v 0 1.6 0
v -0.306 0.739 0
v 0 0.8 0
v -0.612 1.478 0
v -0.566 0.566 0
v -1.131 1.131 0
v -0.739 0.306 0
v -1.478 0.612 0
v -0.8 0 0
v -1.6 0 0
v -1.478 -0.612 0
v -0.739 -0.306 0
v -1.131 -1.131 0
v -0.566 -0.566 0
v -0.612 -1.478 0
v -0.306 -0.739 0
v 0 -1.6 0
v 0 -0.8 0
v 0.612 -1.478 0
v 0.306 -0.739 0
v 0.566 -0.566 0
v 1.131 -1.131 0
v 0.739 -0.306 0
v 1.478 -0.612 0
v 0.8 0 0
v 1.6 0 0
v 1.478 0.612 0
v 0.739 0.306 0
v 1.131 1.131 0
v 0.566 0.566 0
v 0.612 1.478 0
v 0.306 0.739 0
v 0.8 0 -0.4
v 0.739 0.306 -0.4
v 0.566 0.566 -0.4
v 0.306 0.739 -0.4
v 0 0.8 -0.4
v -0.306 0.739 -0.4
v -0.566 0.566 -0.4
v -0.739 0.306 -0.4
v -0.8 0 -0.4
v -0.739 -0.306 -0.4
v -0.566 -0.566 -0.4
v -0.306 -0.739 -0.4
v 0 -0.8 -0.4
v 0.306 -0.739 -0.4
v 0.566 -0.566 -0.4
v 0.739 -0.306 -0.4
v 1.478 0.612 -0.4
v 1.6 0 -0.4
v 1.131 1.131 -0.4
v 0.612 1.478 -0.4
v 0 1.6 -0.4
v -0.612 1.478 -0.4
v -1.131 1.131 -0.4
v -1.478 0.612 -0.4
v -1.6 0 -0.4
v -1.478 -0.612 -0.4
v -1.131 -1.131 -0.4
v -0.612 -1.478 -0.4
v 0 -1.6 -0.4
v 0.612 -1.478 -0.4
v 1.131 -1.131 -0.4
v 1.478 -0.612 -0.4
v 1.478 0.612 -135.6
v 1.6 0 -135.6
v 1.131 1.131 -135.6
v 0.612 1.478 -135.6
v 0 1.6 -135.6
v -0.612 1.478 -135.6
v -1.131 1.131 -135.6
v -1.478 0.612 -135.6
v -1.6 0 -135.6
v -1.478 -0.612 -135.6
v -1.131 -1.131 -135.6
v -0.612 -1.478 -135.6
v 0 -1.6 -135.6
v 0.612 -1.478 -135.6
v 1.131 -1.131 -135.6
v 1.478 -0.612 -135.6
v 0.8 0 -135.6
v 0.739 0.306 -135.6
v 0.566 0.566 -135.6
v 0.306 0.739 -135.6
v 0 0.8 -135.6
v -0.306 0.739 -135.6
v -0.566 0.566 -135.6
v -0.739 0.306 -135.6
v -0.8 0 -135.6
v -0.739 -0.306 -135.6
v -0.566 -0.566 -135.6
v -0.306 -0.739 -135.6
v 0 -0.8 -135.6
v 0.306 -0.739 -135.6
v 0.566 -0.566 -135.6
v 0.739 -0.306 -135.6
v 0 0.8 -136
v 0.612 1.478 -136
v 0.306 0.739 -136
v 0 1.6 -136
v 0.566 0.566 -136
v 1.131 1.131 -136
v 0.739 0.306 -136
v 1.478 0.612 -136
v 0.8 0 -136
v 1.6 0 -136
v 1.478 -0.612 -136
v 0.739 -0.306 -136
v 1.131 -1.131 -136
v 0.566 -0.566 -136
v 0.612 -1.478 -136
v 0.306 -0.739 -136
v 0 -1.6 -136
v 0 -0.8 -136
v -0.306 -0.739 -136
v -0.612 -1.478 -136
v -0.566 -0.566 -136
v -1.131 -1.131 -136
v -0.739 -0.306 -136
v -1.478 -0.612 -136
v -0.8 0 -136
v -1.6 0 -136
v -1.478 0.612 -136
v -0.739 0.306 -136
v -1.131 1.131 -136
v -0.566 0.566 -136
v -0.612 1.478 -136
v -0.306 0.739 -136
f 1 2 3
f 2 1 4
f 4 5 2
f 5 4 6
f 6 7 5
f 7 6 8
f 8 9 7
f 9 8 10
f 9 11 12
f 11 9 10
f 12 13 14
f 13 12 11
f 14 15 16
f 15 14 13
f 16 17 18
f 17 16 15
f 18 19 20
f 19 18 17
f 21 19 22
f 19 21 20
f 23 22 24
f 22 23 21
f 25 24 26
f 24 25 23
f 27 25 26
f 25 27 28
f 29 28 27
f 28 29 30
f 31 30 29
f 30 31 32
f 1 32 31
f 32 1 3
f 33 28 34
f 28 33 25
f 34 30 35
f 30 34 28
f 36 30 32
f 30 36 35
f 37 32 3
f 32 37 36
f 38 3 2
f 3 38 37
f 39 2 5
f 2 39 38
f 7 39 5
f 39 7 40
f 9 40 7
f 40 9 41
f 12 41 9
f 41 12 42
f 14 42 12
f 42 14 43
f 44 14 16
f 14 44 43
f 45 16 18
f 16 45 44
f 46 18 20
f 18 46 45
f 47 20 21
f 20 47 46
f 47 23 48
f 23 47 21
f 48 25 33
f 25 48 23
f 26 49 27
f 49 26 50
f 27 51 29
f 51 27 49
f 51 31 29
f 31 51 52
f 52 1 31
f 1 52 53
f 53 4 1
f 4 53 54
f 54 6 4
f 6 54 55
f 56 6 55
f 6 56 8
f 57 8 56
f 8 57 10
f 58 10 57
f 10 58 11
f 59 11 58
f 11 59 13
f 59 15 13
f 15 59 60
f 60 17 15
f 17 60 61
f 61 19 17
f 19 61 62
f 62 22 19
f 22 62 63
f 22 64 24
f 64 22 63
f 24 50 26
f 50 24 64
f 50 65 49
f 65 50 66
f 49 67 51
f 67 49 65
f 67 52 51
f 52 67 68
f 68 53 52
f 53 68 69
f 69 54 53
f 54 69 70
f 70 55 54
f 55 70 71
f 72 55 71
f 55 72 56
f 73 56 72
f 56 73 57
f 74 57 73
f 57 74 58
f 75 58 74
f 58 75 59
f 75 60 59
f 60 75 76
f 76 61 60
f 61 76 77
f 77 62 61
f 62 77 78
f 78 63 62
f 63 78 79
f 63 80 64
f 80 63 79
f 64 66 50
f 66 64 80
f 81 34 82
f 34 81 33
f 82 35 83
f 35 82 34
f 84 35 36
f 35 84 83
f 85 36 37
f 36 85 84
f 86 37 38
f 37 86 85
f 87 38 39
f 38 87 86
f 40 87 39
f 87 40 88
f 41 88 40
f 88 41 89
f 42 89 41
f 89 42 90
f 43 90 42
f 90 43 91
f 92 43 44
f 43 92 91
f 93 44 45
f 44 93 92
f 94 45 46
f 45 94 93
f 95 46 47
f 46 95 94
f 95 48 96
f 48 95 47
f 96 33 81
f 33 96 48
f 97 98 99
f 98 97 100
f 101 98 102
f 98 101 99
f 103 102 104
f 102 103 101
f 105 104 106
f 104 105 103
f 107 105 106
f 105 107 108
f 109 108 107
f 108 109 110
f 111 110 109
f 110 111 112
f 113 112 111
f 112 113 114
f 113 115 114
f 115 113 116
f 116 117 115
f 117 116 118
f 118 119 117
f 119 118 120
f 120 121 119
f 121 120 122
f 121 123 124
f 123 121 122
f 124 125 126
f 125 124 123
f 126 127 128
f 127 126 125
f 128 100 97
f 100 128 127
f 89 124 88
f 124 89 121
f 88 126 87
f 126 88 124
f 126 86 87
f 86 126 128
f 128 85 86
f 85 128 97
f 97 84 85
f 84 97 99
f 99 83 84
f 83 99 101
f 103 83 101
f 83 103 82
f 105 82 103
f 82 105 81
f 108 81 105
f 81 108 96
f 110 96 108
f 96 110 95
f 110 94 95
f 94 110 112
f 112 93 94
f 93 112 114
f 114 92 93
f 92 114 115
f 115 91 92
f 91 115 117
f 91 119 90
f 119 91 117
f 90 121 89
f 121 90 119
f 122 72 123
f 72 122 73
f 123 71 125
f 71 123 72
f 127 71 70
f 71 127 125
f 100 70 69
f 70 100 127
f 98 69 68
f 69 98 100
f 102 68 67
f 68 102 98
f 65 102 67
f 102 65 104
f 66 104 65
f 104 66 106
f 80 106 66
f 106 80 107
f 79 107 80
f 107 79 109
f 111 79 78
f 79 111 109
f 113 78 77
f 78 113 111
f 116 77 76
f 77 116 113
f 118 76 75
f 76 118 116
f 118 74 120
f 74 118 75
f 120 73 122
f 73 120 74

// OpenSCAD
// file: ../p/4-4ring1.scad
use <../lib.scad>
function ldraw_lib__4_4ring1() = [
// 0 Ring  1 x 1.0
// 0 Name: 4-4ring1.dat
// 0 Author: James Jessiman
// 0 !LDRAW_ORG Primitive UPDATE 2009-01
// 0 !LICENSE Licensed under CC BY 2.0 and CC BY 4.0 : see CAreadme.txt
// 
// 0 BFC CERTIFY CCW
  [0,"BFC","CERTIFY"],
  [0,"BFC","CCW"],
// 
// 0 !HISTORY 1998-12-15 [PTadmin] Official Update 1998-10
// 0 !HISTORY 2002-04-08 [BrickCaster] Modified for BFC compliance
// 0 !HISTORY 2002-04-25 [PTadmin] Official Update 2002-02
// 0 !HISTORY 2007-06-24 [PTadmin] Header formatted for Contributor Agreement
// 0 !HISTORY 2008-07-01 [PTadmin] Official Update 2008-01
// 0 !HISTORY 2008-08-26 [cwdee] Switch polygon winding and rename
// 0 !HISTORY 2009-05-02 [PTadmin] Official Update 2009-01
// 
// 
// 4 16 -0.7654 0 1.8478 -0.3827 0 0.9239 0 0 1 0 0 2
  [4,16,-0.7654,0,1.8478,-0.3827,0,0.9239,0,0,1,0,0,2],
// 4 16 -1.4142 0 1.4142 -0.7071 0 0.7071 -0.3827 0 0.9239 -0.7654 0 1.8478
  [4,16,-1.4142,0,1.4142,-0.7071,0,0.7071,-0.3827,0,0.9239,-0.7654,0,1.8478],
// 4 16 -1.8478 0 0.7654 -0.9239 0 0.3827 -0.7071 0 0.7071 -1.4142 0 1.41420
  [4,16,-1.8478,0,0.7654,-0.9239,0,0.3827,-0.7071,0,0.7071,-1.4142,0,1.41420],
// 4 16 -2 0 0 -1 0 0 -0.9239 0 0.3827 -1.8478 0 0.7654
  [4,16,-2,0,0,-1,0,0,-0.9239,0,0.3827,-1.8478,0,0.7654],
// 4 16 -1.8478 0 -0.7654 -0.9239 0 -0.3827 -1 0 0 -2 0 0
  [4,16,-1.8478,0,-0.7654,-0.9239,0,-0.3827,-1,0,0,-2,0,0],
// 4 16 -1.4142 0 -1.4142 -0.7071 0 -0.7071 -0.9239 0 -0.3827 -1.8478 0 -0.7654
  [4,16,-1.4142,0,-1.4142,-0.7071,0,-0.7071,-0.9239,0,-0.3827,-1.8478,0,-0.7654],
// 4 16 -0.7654 0 -1.8478 -0.3827 0 -0.9239 -0.7071 0 -0.7071 -1.4142 0 -1.4142
  [4,16,-0.7654,0,-1.8478,-0.3827,0,-0.9239,-0.7071,0,-0.7071,-1.4142,0,-1.4142],
// 4 16 0 0 -2 0 0 -1 -0.3827 0 -0.9239 -0.7654 0 -1.8478
  [4,16,0,0,-2,0,0,-1,-0.3827,0,-0.9239,-0.7654,0,-1.8478],
// 4 16 0.7654 0 -1.8478 0.3827 0 -0.9239 0 0 -1 0 0 -2
  [4,16,0.7654,0,-1.8478,0.3827,0,-0.9239,0,0,-1,0,0,-2],
// 4 16 1.4142 0 -1.4142 0.7071 0 -0.7071 0.3827 0 -0.9239 0.7654 0 -1.8478
  [4,16,1.4142,0,-1.4142,0.7071,0,-0.7071,0.3827,0,-0.9239,0.7654,0,-1.8478],
// 4 16 1.8478 0 -0.7654 0.9239 0 -0.3827 0.7071 0 -0.7071 1.4142 0 -1.4142
  [4,16,1.8478,0,-0.7654,0.9239,0,-0.3827,0.7071,0,-0.7071,1.4142,0,-1.4142],
// 4 16 2 0 0 1 0 0 0.9239 0 -0.3827 1.8478 0 -0.7654
  [4,16,2,0,0,1,0,0,0.9239,0,-0.3827,1.8478,0,-0.7654],
// 4 16 1.8478 0 0.7654 0.9239 0 0.3827 1 0 0 2 0 0
  [4,16,1.8478,0,0.7654,0.9239,0,0.3827,1,0,0,2,0,0],
// 4 16 1.4142 0 1.4142 0.7071 0 0.7071 0.9239 0 0.3827 1.8478 0 0.7654
  [4,16,1.4142,0,1.4142,0.7071,0,0.7071,0.9239,0,0.3827,1.8478,0,0.7654],
// 4 16 0.7654 0 1.8478 0.3827 0 0.9239 0.7071 0 0.7071 1.4142 0 1.4142
  [4,16,0.7654,0,1.8478,0.3827,0,0.9239,0.7071,0,0.7071,1.4142,0,1.4142],
// 4 16 0 0 2 0 0 1 0.3827 0 0.9239 0.7654 0 1.8478
  [4,16,0,0,2,0,0,1,0.3827,0,0.9239,0.7654,0,1.8478],
// 0
];
module ldraw_lib__4_4ring1(step=0, col=false, unit=2/5, alt=false, line=0.2, solid=!$preview)
    makepoly(ldraw_lib__4_4ring1(), step=step, col=col, unit=unit, alt=alt, line=line, solid=solid);
ldraw_lib__4_4ring1(line=0.2);
// file: ../p/4-4edge.scad
use <../lib.scad>
function ldraw_lib__4_4edge() = [
// 0 Circle 1.0
// 0 Name: 4-4edge.dat
// 0 Author: James Jessiman
// 0 !LDRAW_ORG Primitive UPDATE 2017-01
// 0 !LICENSE Licensed under CC BY 2.0 and CC BY 4.0 : see CAreadme.txt
// 
// 0 BFC CERTIFY CCW
  [0,"BFC","CERTIFY"],
  [0,"BFC","CCW"],
// 
// 0 !HISTORY 1998-12-15 [PTadmin] Official Update 1998-10
// 0 !HISTORY 2005-12-28 [PTadmin] Official Update 2005-01
// 0 !HISTORY 2007-06-24 [PTadmin] Header formatted for Contributor Agreement
// 0 !HISTORY 2008-07-01 [PTadmin] Official Update 2008-01
// 0 !HISTORY 2017-01-15 [Steffen] BFCed
// 0 !HISTORY 2017-12-30 [PTadmin] Official Update 2017-01
// 
// 
// 2 24 1 0 0 0.9239 0 0.3827
  [2,24,1,0,0,0.9239,0,0.3827],
// 2 24 0.9239 0 0.3827 0.7071 0 0.7071
  [2,24,0.9239,0,0.3827,0.7071,0,0.7071],
// 2 24 0.7071 0 0.7071 0.3827 0 0.9239
  [2,24,0.7071,0,0.7071,0.3827,0,0.9239],
// 2 24 0.3827 0 0.9239 0 0 1
  [2,24,0.3827,0,0.9239,0,0,1],
// 2 24 0 0 1 -0.3827 0 0.9239
  [2,24,0,0,1,-0.3827,0,0.9239],
// 2 24 -0.3827 0 0.9239 -0.7071 0 0.7071
  [2,24,-0.3827,0,0.9239,-0.7071,0,0.7071],
// 2 24 -0.7071 0 0.7071 -0.9239 0 0.3827
  [2,24,-0.7071,0,0.7071,-0.9239,0,0.3827],
// 2 24 -0.9239 0 0.3827 -1 0 -0
  [2,24,-0.9239,0,0.3827,-1,0,-0],
// 2 24 -1 0 -0 -0.9239 0 -0.3827
  [2,24,-1,0,-0,-0.9239,0,-0.3827],
// 2 24 -0.9239 0 -0.3827 -0.7071 0 -0.7071
  [2,24,-0.9239,0,-0.3827,-0.7071,0,-0.7071],
// 2 24 -0.7071 0 -0.7071 -0.3827 0 -0.9239
  [2,24,-0.7071,0,-0.7071,-0.3827,0,-0.9239],
// 2 24 -0.3827 0 -0.9239 0 0 -1
  [2,24,-0.3827,0,-0.9239,0,0,-1],
// 2 24 0 0 -1 0.3827 0 -0.9239
  [2,24,0,0,-1,0.3827,0,-0.9239],
// 2 24 0.3827 0 -0.9239 0.7071 0 -0.7071
  [2,24,0.3827,0,-0.9239,0.7071,0,-0.7071],
// 2 24 0.7071 0 -0.7071 0.9239 0 -0.3827
  [2,24,0.7071,0,-0.7071,0.9239,0,-0.3827],
// 2 24 0.9239 0 -0.3827 1 0 0
  [2,24,0.9239,0,-0.3827,1,0,0],
];
module ldraw_lib__4_4edge(step=0, col=false, unit=2/5, alt=false, line=0.2, solid=!$preview)
    makepoly(ldraw_lib__4_4edge(), step=step, col=col, unit=unit, alt=alt, line=line, solid=solid);
ldraw_lib__4_4edge(line=0.2);
// file: ../p/4-4cyli.scad
use <../lib.scad>
function ldraw_lib__4_4cyli() = [
// 0 Cylinder 1.0
// 0 Name: 4-4cyli.dat
// 0 Author: James Jessiman
// 0 !LDRAW_ORG Primitive UPDATE 2005-01
// 0 !LICENSE Licensed under CC BY 2.0 and CC BY 4.0 : see CAreadme.txt
// 
// 0 BFC CERTIFY CCW
  [0,"BFC","CERTIFY"],
  [0,"BFC","CCW"],
// 
// 0 !HISTORY 1998-12-15 [PTadmin] Official Update 1998-10
// 0 !HISTORY 2002-03-23 [sbliss] Added BFC statement; merged headers from files in distributions LDraw 0.27 and Complete.
// 0 !HISTORY 2002-04-25 [PTadmin] Official Update 2002-02
// 0 !HISTORY 2004-12-14 [guyvivan] BFC CCW
// 0 !HISTORY 2005-12-28 [PTadmin] Official Update 2005-01
// 0 !HISTORY 2007-06-24 [PTadmin] Header formatted for Contributor Agreement
// 0 !HISTORY 2008-07-01 [PTadmin] Official Update 2008-01
// 
// 
// 4 16 1 1 0 0.9239 1 0.3827 0.9239 0 0.3827 1 0 0
  [4,16,1,1,0,0.9239,1,0.3827,0.9239,0,0.3827,1,0,0],
// 5 24 1 0 0 1 1 0 0.9239 0 0.3827 0.9239 0 -0.3827
  [5,24,1,0,0,1,1,0,0.9239,0,0.3827,0.9239,0,-0.3827],
// 4 16 0.9239 1 0.3827 0.7071 1 0.7071 0.7071 0 0.7071 0.9239 0 0.3827
  [4,16,0.9239,1,0.3827,0.7071,1,0.7071,0.7071,0,0.7071,0.9239,0,0.3827],
// 5 24 0.9239 0 0.3827 0.9239 1 0.3827 0.7071 0 0.7071 1 0 0
  [5,24,0.9239,0,0.3827,0.9239,1,0.3827,0.7071,0,0.7071,1,0,0],
// 4 16 0.7071 1 0.7071 0.3827 1 0.9239 0.3827 0 0.9239 0.7071 0 0.7071
  [4,16,0.7071,1,0.7071,0.3827,1,0.9239,0.3827,0,0.9239,0.7071,0,0.7071],
// 5 24 0.7071 0 0.7071 0.7071 1 0.7071 0.3827 0 0.9239 0.9239 0 0.3827
  [5,24,0.7071,0,0.7071,0.7071,1,0.7071,0.3827,0,0.9239,0.9239,0,0.3827],
// 4 16 0.3827 1 0.9239 0 1 1 0 0 1 0.3827 0 0.9239
  [4,16,0.3827,1,0.9239,0,1,1,0,0,1,0.3827,0,0.9239],
// 5 24 0.3827 0 0.9239 0.3827 1 0.9239 0 0 1 0.7071 0 0.7071
  [5,24,0.3827,0,0.9239,0.3827,1,0.9239,0,0,1,0.7071,0,0.7071],
// 4 16 0 1 1 -0.3827 1 0.9239 -0.3827 0 0.9239 0 0 1
  [4,16,0,1,1,-0.3827,1,0.9239,-0.3827,0,0.9239,0,0,1],
// 5 24 0 0 1 0 1 1 -0.3827 0 0.9239 0.3827 0 0.9239
  [5,24,0,0,1,0,1,1,-0.3827,0,0.9239,0.3827,0,0.9239],
// 4 16 -0.3827 1 0.9239 -0.7071 1 0.7071 -0.7071 0 0.7071 -0.3827 0 0.9239
  [4,16,-0.3827,1,0.9239,-0.7071,1,0.7071,-0.7071,0,0.7071,-0.3827,0,0.9239],
// 5 24 -0.3827 0 0.9239 -0.3827 1 0.9239 -0.7071 0 0.7071 0 0 1
  [5,24,-0.3827,0,0.9239,-0.3827,1,0.9239,-0.7071,0,0.7071,0,0,1],
// 4 16 -0.7071 1 0.7071 -0.9239 1 0.3827 -0.9239 0 0.3827 -0.7071 0 0.7071
  [4,16,-0.7071,1,0.7071,-0.9239,1,0.3827,-0.9239,0,0.3827,-0.7071,0,0.7071],
// 5 24 -0.7071 0 0.7071 -0.7071 1 0.7071 -0.9239 0 0.3827 -0.3827 0 0.9239
  [5,24,-0.7071,0,0.7071,-0.7071,1,0.7071,-0.9239,0,0.3827,-0.3827,0,0.9239],
// 4 16 -0.9239 1 0.3827 -1 1 0 -1 0 0 -0.9239 0 0.3827
  [4,16,-0.9239,1,0.3827,-1,1,0,-1,0,0,-0.9239,0,0.3827],
// 5 24 -0.9239 0 0.3827 -0.9239 1 0.3827 -1 0 0 -0.7071 0 0.7071
  [5,24,-0.9239,0,0.3827,-0.9239,1,0.3827,-1,0,0,-0.7071,0,0.7071],
// 4 16 -1 1 0 -0.9239 1 -0.3827 -0.9239 0 -0.3827 -1 0 0
  [4,16,-1,1,0,-0.9239,1,-0.3827,-0.9239,0,-0.3827,-1,0,0],
// 5 24 -1 0 0 -1 1 0 -0.9239 0 -0.3827 -0.9239 0 0.3827
  [5,24,-1,0,0,-1,1,0,-0.9239,0,-0.3827,-0.9239,0,0.3827],
// 4 16 -0.9239 1 -0.3827 -0.7071 1 -0.7071 -0.7071 0 -0.7071 -0.9239 0 -0.3827
  [4,16,-0.9239,1,-0.3827,-0.7071,1,-0.7071,-0.7071,0,-0.7071,-0.9239,0,-0.3827],
// 5 24 -0.9239 0 -0.3827 -0.9239 1 -0.3827 -0.7071 0 -0.7071 -1 0 0
  [5,24,-0.9239,0,-0.3827,-0.9239,1,-0.3827,-0.7071,0,-0.7071,-1,0,0],
// 4 16 -0.7071 1 -0.7071 -0.3827 1 -0.9239 -0.3827 0 -0.9239 -0.7071 0 -0.7071
  [4,16,-0.7071,1,-0.7071,-0.3827,1,-0.9239,-0.3827,0,-0.9239,-0.7071,0,-0.7071],
// 5 24 -0.7071 0 -0.7071 -0.7071 1 -0.7071 -0.3827 0 -0.9239 -0.9239 0 -0.3827
  [5,24,-0.7071,0,-0.7071,-0.7071,1,-0.7071,-0.3827,0,-0.9239,-0.9239,0,-0.3827],
// 4 16 -0.3827 1 -0.9239 0 1 -1 0 0 -1 -0.3827 0 -0.9239
  [4,16,-0.3827,1,-0.9239,0,1,-1,0,0,-1,-0.3827,0,-0.9239],
// 5 24 -0.3827 0 -0.9239 -0.3827 1 -0.9239 0 0 -1 -0.7071 0 -0.7071
  [5,24,-0.3827,0,-0.9239,-0.3827,1,-0.9239,0,0,-1,-0.7071,0,-0.7071],
// 4 16 0 1 -1 0.3827 1 -0.9239 0.3827 0 -0.9239 0 0 -1
  [4,16,0,1,-1,0.3827,1,-0.9239,0.3827,0,-0.9239,0,0,-1],
// 5 24 0 0 -1 0 1 -1 0.3827 0 -0.9239 -0.3827 0 -0.9239
  [5,24,0,0,-1,0,1,-1,0.3827,0,-0.9239,-0.3827,0,-0.9239],
// 4 16 0.3827 1 -0.9239 0.7071 1 -0.7071 0.7071 0 -0.7071 0.3827 0 -0.9239
  [4,16,0.3827,1,-0.9239,0.7071,1,-0.7071,0.7071,0,-0.7071,0.3827,0,-0.9239],
// 5 24 0.3827 0 -0.9239 0.3827 1 -0.9239 0.7071 0 -0.7071 0 0 -1
  [5,24,0.3827,0,-0.9239,0.3827,1,-0.9239,0.7071,0,-0.7071,0,0,-1],
// 4 16 0.7071 1 -0.7071 0.9239 1 -0.3827 0.9239 0 -0.3827 0.7071 0 -0.7071
  [4,16,0.7071,1,-0.7071,0.9239,1,-0.3827,0.9239,0,-0.3827,0.7071,0,-0.7071],
// 5 24 0.7071 0 -0.7071 0.7071 1 -0.7071 0.9239 0 -0.3827 0.3827 0 -0.9239
  [5,24,0.7071,0,-0.7071,0.7071,1,-0.7071,0.9239,0,-0.3827,0.3827,0,-0.9239],
// 4 16 0.9239 1 -0.3827 1 1 0 1 0 0 0.9239 0 -0.3827
  [4,16,0.9239,1,-0.3827,1,1,0,1,0,0,0.9239,0,-0.3827],
// 5 24 0.9239 0 -0.3827 0.9239 1 -0.3827 1 0 0 0.7071 0 -0.7071
  [5,24,0.9239,0,-0.3827,0.9239,1,-0.3827,1,0,0,0.7071,0,-0.7071],
// 0
];
module ldraw_lib__4_4cyli(step=0, col=false, unit=2/5, alt=false, line=0.2, solid=!$preview)
    makepoly(ldraw_lib__4_4cyli(), step=step, col=col, unit=unit, alt=alt, line=line, solid=solid);
ldraw_lib__4_4cyli(line=0.2);
// file: u9053.scad
use <../lib.scad>
use <../p/4-4cyli.scad>
use <../p/4-4edge.scad>
use <../p/4-4ring1.scad>
function ldraw_lib__u9053() = [
// 0 ~Technic Flex-System Hose End
// 0 Name: u9053.dat
// 0 Author: William Howard [WilliamH]
// 0 !LDRAW_ORG Part UPDATE 2011-02
// 0 !LICENSE Licensed under CC BY 2.0 and CC BY 4.0 : see CAreadme.txt
// 
// 0 BFC CERTIFY CCW
  [0,"BFC","CERTIFY"],
  [0,"BFC","CCW"],
// 
// 0 !HISTORY 2011-12-21 [cwdee] Reworked subparting technique
// 0 !HISTORY 2011-12-23 [PTadmin] Renamed from 76
// 0 !HISTORY 2011-12-29 [PTadmin] Official Update 2011-02
// 
// 
// 1 16 0 0 0 2 0 0 0 1 0 0 0 2 4-4ring1.dat
  [1,16,0,0,0,2,0,0,0,1,0,0,0,2, ldraw_lib__4_4ring1()],
// 1 16 0 0 0 2 0 0 0 1 0 0 0 2 4-4edge.dat
  [1,16,0,0,0,2,0,0,0,1,0,0,0,2, ldraw_lib__4_4edge()],
// 0 BFC INVERTNEXT
  [0,"BFC","INVERTNEXT"],
// 1 16 0 0 0 2 0 0 0 1 0 0 0 2 4-4cyli.dat
  [1,16,0,0,0,2,0,0,0,1,0,0,0,2, ldraw_lib__4_4cyli()],
// 1 16 0 0 0 4 0 0 0 1 0 0 0 4 4-4edge.dat
  [1,16,0,0,0,4,0,0,0,1,0,0,0,4, ldraw_lib__4_4edge()],
// 1 16 0 0 0 4 0 0 0 1 0 0 0 4 4-4cyli.dat
  [1,16,0,0,0,4,0,0,0,1,0,0,0,4, ldraw_lib__4_4cyli()],
// 0
];
module ldraw_lib__u9053(step=0, col=false, unit=2/5, alt=false, line=0.2, solid=!$preview)
    makepoly(ldraw_lib__u9053(), step=step, col=col, unit=unit, alt=alt, line=line, solid=solid);
ldraw_lib__u9053(line=0.2);
// file: 77.scad
use <../lib.scad>
use <../p/4-4cyli.scad>
function ldraw_lib__77() = [
// 0 ~Technic Flex-System Hose Segment
// 0 Name: 77.dat
// 0 Author: William Howard [WilliamH]
// 0 !LDRAW_ORG Part UPDATE 2011-02
// 0 !LICENSE Licensed under CC BY 2.0 and CC BY 4.0 : see CAreadme.txt
// 
// 0 BFC CERTIFY CCW
  [0,"BFC","CERTIFY"],
  [0,"BFC","CCW"],
// 
// 0 !HISTORY 2011-12-21 [cwdee] Reworked subparting technique
// 0 !HISTORY 2011-12-29 [PTadmin] Official Update 2011-02
// 
// 
// 1 16 0 0 0 4 0 0 0 1 0 0 0 4 4-4cyli.dat
  [1,16,0,0,0,4,0,0,0,1,0,0,0,4, ldraw_lib__4_4cyli()],
// 0 BFC INVERTNEXT
  [0,"BFC","INVERTNEXT"],
// 1 16 0 0 0 2 0 0 0 1 0 0 0 2 4-4cyli.dat
  [1,16,0,0,0,2,0,0,0,1,0,0,0,2, ldraw_lib__4_4cyli()],
// 0
];
module ldraw_lib__77(step=0, col=false, unit=2/5, alt=false, line=0.2, solid=!$preview)
    makepoly(ldraw_lib__77(), step=step, col=col, unit=unit, alt=alt, line=line, solid=solid);
ldraw_lib__77(line=0.2);
// main file
use <../lib.scad>
use <77.scad>
use <u9053.scad>
function ldraw_lib__76270() = [
// 0 Technic Flex-System Hose 17L (340LDU)
// 0 Name: 76270.dat
// 0 Author: Tim Gould [timgould]
// 0 !LDRAW_ORG Part UPDATE 2011-02
// 0 !LICENSE Licensed under CC BY 2.0 and CC BY 4.0 : see CAreadme.txt
// 
// 0 BFC CERTIFY CCW
  [0,"BFC","CERTIFY"],
  [0,"BFC","CCW"],
// 
// 0 !KEYWORDS bar, tube
// 
// 0 !HISTORY 2011-12-29 [PTadmin] Official Update 2011-02
// 
// 
// 1 16 0 0 0 1 0 0 0 1 0 0 0 1 u9053.dat
  [1,16,0,0,0,1,0,0,0,1,0,0,0,1, ldraw_lib__u9053()],
// 1 16 0 1 0 1 0 0 0 338 0 0 0 1 77.dat
  [1,16,0,1,0,1,0,0,0,338,0,0,0,1, ldraw_lib__77()],
// 1 16 0 340 0 -1 0 0 0 -1 0 0 0 1 u9053.dat
  [1,16,0,340,0,-1,0,0,0,-1,0,0,0,1, ldraw_lib__u9053()],
];
module ldraw_lib__76270(step=0, col=false, unit=2/5, alt=false, line=0.2, solid=!$preview)
    makepoly(ldraw_lib__76270(), step=step, col=col, unit=unit, alt=alt, line=line, solid=solid);
ldraw_lib__76270(line=0.2);
